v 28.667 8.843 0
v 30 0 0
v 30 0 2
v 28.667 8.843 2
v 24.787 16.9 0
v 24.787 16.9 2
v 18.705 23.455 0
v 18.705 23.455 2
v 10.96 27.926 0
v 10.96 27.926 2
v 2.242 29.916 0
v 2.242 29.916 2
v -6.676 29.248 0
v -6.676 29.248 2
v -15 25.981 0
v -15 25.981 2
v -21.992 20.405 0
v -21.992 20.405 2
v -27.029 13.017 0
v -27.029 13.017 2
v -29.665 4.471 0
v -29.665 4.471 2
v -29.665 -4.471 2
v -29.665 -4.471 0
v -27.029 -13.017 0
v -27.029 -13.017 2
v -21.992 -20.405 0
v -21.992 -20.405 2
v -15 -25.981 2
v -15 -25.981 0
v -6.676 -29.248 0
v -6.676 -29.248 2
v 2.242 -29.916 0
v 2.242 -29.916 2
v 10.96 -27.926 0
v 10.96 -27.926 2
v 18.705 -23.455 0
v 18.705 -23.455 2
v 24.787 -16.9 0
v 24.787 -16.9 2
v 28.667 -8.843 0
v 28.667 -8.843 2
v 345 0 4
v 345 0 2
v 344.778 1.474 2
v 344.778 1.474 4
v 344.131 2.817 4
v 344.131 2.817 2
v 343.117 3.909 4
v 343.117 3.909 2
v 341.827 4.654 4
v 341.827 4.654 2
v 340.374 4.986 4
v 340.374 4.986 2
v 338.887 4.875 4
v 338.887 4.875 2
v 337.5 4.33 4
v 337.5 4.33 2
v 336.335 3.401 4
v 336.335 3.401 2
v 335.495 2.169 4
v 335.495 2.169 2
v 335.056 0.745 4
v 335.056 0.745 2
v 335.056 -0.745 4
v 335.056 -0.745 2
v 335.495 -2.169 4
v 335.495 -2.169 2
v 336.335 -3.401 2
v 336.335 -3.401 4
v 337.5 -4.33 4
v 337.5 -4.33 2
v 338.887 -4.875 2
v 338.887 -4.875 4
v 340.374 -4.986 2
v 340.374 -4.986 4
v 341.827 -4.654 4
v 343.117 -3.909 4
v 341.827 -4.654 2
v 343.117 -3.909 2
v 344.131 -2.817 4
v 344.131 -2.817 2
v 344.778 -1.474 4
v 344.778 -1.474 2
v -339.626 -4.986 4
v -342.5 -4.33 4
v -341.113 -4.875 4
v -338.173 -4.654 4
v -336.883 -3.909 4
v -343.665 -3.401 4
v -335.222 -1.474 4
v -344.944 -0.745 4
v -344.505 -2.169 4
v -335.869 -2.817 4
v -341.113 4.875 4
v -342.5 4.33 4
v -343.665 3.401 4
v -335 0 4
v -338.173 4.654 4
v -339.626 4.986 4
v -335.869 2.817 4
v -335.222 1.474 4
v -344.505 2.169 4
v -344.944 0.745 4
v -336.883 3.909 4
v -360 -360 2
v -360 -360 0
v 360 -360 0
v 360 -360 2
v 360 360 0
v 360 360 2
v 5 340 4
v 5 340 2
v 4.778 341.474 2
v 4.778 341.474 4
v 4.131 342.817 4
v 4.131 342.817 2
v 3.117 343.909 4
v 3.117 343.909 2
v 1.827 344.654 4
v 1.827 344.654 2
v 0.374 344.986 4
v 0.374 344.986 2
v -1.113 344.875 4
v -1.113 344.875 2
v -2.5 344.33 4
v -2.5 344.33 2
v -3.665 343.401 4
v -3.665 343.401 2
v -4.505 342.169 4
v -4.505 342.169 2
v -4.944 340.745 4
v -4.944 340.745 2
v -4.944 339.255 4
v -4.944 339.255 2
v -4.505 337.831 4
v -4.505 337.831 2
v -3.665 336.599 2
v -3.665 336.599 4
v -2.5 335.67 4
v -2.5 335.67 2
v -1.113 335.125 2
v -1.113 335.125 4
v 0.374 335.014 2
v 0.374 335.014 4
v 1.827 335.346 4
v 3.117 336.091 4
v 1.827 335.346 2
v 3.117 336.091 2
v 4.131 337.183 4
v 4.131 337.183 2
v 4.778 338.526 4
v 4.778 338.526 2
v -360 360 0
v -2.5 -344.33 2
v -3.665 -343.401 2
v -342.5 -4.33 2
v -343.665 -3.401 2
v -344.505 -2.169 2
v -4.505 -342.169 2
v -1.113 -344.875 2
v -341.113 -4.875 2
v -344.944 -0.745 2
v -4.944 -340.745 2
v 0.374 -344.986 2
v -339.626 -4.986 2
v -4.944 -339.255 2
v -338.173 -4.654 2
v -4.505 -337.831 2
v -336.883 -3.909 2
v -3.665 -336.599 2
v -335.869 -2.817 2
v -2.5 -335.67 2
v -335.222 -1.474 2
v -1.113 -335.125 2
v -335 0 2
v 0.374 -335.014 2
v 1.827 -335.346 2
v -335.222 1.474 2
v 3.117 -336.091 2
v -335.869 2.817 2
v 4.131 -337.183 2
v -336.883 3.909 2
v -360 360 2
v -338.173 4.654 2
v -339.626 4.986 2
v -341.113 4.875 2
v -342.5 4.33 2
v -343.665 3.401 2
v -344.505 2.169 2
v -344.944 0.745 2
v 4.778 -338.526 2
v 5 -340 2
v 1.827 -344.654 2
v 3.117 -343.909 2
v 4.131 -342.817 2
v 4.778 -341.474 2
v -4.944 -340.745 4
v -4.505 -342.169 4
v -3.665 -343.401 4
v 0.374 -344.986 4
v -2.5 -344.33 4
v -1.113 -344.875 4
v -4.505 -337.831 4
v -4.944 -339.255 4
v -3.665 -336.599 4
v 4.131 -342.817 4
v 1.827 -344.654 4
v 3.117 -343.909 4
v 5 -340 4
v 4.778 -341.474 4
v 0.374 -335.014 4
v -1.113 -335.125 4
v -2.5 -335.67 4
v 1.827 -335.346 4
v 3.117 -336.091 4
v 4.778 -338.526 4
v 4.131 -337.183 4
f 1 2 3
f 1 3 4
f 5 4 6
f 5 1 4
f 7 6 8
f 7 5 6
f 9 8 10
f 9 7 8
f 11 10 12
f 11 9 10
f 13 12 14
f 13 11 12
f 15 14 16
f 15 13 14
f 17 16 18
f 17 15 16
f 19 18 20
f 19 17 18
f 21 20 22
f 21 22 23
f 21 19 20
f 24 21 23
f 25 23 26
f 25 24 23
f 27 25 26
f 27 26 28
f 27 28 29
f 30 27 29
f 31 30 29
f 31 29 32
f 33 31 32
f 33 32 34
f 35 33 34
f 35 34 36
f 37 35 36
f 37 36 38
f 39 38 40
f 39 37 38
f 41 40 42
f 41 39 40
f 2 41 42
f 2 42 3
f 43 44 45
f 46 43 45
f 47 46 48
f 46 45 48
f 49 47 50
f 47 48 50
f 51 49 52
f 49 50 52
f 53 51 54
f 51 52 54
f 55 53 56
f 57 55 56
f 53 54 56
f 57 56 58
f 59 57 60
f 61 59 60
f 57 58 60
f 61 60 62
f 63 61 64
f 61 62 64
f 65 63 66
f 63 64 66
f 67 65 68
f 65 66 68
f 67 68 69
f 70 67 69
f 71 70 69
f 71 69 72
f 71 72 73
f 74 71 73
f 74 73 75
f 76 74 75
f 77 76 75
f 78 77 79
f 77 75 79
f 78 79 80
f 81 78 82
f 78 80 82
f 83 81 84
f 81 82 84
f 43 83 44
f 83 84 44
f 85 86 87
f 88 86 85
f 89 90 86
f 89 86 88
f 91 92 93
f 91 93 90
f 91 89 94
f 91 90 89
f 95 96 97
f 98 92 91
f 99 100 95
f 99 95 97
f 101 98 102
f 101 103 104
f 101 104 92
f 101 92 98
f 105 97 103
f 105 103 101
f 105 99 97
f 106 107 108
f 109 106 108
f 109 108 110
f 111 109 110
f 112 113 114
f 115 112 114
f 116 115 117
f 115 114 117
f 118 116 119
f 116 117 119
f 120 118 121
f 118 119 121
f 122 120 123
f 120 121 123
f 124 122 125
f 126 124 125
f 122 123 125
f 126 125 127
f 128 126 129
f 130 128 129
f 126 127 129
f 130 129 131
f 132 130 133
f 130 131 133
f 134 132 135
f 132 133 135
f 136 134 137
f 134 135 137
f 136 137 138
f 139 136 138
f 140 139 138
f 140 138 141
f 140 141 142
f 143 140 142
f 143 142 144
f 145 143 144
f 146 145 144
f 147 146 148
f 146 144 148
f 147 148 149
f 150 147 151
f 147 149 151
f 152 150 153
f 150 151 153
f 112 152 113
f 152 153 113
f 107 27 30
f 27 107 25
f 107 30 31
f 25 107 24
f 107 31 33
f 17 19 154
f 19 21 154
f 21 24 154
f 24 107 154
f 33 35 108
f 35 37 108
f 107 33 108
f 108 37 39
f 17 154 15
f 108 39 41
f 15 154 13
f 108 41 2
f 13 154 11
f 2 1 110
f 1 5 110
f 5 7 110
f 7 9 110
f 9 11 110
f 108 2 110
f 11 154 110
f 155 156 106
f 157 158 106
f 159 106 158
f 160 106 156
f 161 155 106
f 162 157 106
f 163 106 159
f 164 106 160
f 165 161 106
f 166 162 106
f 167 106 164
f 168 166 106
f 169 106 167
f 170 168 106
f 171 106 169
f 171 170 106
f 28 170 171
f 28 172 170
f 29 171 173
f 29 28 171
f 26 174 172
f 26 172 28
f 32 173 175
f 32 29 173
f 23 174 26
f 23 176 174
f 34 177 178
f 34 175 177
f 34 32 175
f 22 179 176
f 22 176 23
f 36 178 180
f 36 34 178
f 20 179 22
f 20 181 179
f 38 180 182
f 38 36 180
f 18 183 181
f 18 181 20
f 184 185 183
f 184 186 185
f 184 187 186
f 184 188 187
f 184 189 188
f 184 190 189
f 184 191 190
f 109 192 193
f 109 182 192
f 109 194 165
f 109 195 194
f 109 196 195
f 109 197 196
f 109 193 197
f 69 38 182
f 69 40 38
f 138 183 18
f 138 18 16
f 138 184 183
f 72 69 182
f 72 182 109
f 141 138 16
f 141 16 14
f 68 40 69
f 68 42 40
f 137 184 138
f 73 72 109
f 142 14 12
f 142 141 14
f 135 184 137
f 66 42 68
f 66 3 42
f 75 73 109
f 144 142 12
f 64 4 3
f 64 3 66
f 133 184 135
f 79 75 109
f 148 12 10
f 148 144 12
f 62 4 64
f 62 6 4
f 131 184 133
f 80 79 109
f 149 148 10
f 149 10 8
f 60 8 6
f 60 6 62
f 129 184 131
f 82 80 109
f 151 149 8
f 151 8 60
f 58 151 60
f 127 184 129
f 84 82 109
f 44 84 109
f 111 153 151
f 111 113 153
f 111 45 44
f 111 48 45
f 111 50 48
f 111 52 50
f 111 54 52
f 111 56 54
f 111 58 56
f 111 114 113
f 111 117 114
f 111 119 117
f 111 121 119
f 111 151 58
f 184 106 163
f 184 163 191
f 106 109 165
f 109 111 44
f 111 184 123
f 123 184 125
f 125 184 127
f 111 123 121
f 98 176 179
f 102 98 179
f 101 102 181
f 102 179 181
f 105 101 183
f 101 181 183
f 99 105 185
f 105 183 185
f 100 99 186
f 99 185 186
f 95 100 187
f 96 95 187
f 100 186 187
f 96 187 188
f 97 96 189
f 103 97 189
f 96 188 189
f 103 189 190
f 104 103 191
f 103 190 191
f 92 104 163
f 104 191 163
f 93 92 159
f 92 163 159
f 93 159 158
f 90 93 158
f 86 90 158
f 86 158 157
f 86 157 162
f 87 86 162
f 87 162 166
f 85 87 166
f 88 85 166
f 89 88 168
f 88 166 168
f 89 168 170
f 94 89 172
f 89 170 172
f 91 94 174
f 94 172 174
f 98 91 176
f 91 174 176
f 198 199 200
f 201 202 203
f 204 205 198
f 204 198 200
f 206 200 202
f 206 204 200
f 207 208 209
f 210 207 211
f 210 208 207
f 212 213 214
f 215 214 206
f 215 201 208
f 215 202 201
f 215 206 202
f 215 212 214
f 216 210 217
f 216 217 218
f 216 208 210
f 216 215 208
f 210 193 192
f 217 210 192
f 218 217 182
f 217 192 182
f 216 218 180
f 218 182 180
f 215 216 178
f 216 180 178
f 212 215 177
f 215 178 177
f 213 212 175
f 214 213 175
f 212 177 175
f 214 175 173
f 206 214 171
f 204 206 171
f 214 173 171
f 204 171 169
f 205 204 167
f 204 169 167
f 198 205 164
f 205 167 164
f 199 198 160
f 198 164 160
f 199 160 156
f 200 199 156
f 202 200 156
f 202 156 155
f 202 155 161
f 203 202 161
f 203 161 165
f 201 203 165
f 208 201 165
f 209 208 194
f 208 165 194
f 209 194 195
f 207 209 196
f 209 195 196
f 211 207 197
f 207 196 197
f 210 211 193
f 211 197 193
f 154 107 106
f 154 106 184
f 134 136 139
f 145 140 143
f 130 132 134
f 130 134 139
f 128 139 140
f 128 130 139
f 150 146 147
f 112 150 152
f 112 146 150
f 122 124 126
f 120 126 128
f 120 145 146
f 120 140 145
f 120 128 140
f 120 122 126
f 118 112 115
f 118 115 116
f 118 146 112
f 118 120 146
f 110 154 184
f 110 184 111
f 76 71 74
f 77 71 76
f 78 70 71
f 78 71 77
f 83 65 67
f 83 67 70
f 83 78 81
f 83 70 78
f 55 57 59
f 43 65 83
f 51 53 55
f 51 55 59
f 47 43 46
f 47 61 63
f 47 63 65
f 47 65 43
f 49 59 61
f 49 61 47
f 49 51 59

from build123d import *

# Parameters (mm, degrees)
SKETCH2_W           = 720
SKETCH2_H           = 720
SKETCH2_R           = 30
BOSS_EXTRUDE1_DEPTH = 2
SKETCH3_R           = 5
BOSS_EXTRUDE2_DEPTH = 2


with BuildPart() as part:
    # Sketch2 → Boss-Extrude1 (new body)
    with BuildSketch(Plane.XY):
        Rectangle(SKETCH2_W, SKETCH2_H)
        Circle(SKETCH2_R, mode=Mode.SUBTRACT)
    extrude(amount=BOSS_EXTRUDE1_DEPTH)

    # Sketch3 → Boss-Extrude2 (add)
    with BuildSketch(Plane.XY.offset(2)):
        with Locations((0, 340)):
            Circle(SKETCH3_R)
        with Locations((-340, 0)):
            Circle(SKETCH3_R)
        with Locations((0, -340)):
            Circle(SKETCH3_R)
        with Locations((340, 0)):
            Circle(SKETCH3_R)
    extrude(amount=BOSS_EXTRUDE2_DEPTH)


solid = part.part
